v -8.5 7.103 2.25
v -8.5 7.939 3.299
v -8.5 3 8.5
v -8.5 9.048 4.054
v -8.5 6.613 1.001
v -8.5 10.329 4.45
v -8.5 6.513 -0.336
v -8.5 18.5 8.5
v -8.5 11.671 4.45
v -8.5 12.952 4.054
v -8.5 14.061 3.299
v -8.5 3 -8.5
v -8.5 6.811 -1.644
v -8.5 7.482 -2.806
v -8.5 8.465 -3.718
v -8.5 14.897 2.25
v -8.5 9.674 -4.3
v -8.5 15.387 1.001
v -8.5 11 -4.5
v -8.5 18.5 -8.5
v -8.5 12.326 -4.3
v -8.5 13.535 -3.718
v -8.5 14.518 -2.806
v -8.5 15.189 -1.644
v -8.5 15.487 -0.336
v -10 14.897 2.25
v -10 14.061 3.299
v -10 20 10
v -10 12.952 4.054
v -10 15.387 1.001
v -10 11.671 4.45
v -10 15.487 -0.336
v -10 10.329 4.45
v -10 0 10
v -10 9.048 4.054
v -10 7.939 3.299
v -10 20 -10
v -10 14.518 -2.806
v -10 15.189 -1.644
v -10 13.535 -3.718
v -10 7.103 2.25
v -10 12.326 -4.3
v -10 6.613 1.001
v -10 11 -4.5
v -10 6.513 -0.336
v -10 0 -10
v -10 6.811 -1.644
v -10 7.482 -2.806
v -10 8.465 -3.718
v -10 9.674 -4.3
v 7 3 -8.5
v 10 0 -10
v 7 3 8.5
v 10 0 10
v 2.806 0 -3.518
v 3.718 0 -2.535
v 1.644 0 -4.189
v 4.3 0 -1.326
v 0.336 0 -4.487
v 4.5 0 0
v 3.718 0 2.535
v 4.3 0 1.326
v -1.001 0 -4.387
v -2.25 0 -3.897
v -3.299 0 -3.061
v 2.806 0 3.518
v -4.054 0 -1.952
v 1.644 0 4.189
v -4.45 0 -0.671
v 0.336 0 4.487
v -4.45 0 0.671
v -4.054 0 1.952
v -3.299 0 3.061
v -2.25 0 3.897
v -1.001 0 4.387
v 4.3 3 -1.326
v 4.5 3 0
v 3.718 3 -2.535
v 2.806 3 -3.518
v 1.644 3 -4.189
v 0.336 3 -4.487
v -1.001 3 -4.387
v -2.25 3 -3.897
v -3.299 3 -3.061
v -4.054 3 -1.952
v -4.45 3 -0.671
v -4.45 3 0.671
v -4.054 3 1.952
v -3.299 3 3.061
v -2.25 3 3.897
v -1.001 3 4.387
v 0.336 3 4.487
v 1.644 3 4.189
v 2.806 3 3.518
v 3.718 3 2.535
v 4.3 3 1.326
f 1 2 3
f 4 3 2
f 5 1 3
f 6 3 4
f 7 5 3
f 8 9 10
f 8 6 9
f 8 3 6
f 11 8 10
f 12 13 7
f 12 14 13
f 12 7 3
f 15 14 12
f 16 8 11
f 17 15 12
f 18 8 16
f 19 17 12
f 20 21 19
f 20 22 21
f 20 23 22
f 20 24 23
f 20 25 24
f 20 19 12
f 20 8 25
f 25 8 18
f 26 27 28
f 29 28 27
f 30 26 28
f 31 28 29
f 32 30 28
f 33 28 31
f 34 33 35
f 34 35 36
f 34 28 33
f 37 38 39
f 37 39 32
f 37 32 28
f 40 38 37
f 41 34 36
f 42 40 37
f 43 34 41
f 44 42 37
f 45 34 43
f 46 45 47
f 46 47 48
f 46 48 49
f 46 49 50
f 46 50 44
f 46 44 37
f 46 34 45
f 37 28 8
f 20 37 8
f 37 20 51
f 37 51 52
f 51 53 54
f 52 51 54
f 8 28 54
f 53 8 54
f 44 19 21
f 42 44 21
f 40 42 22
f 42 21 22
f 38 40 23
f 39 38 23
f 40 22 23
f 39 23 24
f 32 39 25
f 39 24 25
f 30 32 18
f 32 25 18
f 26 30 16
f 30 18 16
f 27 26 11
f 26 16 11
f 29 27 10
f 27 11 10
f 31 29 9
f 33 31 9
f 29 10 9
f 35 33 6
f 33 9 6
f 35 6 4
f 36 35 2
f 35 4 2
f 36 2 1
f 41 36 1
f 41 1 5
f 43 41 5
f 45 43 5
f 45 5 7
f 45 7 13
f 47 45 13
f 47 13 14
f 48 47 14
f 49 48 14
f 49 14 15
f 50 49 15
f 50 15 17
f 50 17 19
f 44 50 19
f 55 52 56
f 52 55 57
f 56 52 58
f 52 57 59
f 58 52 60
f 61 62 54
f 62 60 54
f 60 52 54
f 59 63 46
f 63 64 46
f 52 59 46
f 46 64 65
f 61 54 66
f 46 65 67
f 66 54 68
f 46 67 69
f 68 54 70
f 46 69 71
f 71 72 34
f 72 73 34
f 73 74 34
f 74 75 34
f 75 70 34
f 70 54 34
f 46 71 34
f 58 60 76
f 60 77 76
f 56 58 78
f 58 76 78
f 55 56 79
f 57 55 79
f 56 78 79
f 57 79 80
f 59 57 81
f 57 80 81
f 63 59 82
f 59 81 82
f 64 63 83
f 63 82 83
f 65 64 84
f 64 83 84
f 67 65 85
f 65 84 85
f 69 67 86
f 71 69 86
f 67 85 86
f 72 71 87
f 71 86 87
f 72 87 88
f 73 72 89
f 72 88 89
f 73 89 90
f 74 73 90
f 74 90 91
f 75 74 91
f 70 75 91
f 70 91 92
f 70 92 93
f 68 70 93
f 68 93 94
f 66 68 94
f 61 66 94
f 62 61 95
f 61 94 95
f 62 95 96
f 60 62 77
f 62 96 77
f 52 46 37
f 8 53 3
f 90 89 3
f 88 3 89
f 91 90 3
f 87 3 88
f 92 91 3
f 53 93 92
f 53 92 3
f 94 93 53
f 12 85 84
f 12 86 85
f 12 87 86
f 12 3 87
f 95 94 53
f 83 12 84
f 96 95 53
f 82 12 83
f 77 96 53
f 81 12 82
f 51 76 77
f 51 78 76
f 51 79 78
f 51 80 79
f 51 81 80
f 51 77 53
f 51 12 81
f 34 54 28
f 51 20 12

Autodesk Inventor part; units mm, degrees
ref_plane "YZ Plane" through (0, 0, 0) normal (1, 0, 0) x (0, 1, 0)
ref_plane "XZ Plane" through (0, 0, 0) normal (0, 1, 0) x (-1, 0, 0)
ref_plane "XY Plane" through (0, 0, 0) normal (0, 0, 1) x (1, 0, 0)
sketch "Sketch1" plane through (0, 0, 0) normal (0, 1, 0) x (-1, 0, 0)
  line L0 (-10, 10) -> (10, 10)
  line L1 (10, 10) -> (10, -10)
  line L2 (10, -10) -> (-10, -10)
  line L3 (-10, -10) -> (-10, 10)
  line L4 (-10, 10) -> (10, -10) construction
  line L5 (10, 10) -> (-10, -10) construction
  point P0 (0, 0)
  dimension "d0" = 20
  dimension "d1" = 20
extrude "Extrusion1" add sketch "Sketch1" along normal blind 20
sketch "Sketch2" plane through (0, 20, 0) normal (0, 1, 0) x (1, 0, 0)
  line L0 (8.5, -8.5) -> (-8.5, -8.5)
  line L1 (-8.5, -8.5) -> (-8.5, 8.5)
  line L2 (-8.5, 8.5) -> (8.5, 8.5)
  line L3 (8.5, 8.5) -> (8.5, -8.5)
  line L4 (8.5, -8.5) -> (-8.5, 8.5) construction
  line L5 (-8.5, -8.5) -> (8.5, 8.5) construction
  point P0 (0, 0)
  dimension "d4" = 17
  dimension "d5" = 17
extrude "Extrusion2" cut sketch "Sketch2" against normal blind 17
sketch "Sketch6" plane through (-10, 0, 10) normal (0, 0, 1) x (1, 0, 0)
  line L0 (20, 0) -> (0, 0) projected
  line L1 (0, 20) -> (20, 0)
  line L2 (20, 0) -> (20, 20)
  line L3 (20, 20) -> (0, 20)
  line L4 (1.5, 20) -> (18.5, 20) projected
  point P0 (10, 0)
extrude "Extrusion6" cut sketch "Sketch6" against normal through all
sketch "Sketch7" plane through (0, 3, 0) normal (0, 1, 0) x (1, 0, 0)
  circle A0 centre (0, 0) radius 4.5
  dimension "d20" = 9
sketch "Sketch8" plane through (-8.5, 3, 8.5) normal (1, 0, 0) x (0, 0, -1)
  circle A0 centre (8.5, 8) radius 4.5
  line L0 (0, 0) -> (17, 0) projected
  point P0 (8.5, -3)
  dimension "d18" = 8
  dimension "d19" = 9
extrude "Extrusion7" cut sketch "Sketch8" against normal blind 10
extrude "Extrusion8" cut sketch "Sketch7" against normal blind 10
properties part number "corner bracket"
